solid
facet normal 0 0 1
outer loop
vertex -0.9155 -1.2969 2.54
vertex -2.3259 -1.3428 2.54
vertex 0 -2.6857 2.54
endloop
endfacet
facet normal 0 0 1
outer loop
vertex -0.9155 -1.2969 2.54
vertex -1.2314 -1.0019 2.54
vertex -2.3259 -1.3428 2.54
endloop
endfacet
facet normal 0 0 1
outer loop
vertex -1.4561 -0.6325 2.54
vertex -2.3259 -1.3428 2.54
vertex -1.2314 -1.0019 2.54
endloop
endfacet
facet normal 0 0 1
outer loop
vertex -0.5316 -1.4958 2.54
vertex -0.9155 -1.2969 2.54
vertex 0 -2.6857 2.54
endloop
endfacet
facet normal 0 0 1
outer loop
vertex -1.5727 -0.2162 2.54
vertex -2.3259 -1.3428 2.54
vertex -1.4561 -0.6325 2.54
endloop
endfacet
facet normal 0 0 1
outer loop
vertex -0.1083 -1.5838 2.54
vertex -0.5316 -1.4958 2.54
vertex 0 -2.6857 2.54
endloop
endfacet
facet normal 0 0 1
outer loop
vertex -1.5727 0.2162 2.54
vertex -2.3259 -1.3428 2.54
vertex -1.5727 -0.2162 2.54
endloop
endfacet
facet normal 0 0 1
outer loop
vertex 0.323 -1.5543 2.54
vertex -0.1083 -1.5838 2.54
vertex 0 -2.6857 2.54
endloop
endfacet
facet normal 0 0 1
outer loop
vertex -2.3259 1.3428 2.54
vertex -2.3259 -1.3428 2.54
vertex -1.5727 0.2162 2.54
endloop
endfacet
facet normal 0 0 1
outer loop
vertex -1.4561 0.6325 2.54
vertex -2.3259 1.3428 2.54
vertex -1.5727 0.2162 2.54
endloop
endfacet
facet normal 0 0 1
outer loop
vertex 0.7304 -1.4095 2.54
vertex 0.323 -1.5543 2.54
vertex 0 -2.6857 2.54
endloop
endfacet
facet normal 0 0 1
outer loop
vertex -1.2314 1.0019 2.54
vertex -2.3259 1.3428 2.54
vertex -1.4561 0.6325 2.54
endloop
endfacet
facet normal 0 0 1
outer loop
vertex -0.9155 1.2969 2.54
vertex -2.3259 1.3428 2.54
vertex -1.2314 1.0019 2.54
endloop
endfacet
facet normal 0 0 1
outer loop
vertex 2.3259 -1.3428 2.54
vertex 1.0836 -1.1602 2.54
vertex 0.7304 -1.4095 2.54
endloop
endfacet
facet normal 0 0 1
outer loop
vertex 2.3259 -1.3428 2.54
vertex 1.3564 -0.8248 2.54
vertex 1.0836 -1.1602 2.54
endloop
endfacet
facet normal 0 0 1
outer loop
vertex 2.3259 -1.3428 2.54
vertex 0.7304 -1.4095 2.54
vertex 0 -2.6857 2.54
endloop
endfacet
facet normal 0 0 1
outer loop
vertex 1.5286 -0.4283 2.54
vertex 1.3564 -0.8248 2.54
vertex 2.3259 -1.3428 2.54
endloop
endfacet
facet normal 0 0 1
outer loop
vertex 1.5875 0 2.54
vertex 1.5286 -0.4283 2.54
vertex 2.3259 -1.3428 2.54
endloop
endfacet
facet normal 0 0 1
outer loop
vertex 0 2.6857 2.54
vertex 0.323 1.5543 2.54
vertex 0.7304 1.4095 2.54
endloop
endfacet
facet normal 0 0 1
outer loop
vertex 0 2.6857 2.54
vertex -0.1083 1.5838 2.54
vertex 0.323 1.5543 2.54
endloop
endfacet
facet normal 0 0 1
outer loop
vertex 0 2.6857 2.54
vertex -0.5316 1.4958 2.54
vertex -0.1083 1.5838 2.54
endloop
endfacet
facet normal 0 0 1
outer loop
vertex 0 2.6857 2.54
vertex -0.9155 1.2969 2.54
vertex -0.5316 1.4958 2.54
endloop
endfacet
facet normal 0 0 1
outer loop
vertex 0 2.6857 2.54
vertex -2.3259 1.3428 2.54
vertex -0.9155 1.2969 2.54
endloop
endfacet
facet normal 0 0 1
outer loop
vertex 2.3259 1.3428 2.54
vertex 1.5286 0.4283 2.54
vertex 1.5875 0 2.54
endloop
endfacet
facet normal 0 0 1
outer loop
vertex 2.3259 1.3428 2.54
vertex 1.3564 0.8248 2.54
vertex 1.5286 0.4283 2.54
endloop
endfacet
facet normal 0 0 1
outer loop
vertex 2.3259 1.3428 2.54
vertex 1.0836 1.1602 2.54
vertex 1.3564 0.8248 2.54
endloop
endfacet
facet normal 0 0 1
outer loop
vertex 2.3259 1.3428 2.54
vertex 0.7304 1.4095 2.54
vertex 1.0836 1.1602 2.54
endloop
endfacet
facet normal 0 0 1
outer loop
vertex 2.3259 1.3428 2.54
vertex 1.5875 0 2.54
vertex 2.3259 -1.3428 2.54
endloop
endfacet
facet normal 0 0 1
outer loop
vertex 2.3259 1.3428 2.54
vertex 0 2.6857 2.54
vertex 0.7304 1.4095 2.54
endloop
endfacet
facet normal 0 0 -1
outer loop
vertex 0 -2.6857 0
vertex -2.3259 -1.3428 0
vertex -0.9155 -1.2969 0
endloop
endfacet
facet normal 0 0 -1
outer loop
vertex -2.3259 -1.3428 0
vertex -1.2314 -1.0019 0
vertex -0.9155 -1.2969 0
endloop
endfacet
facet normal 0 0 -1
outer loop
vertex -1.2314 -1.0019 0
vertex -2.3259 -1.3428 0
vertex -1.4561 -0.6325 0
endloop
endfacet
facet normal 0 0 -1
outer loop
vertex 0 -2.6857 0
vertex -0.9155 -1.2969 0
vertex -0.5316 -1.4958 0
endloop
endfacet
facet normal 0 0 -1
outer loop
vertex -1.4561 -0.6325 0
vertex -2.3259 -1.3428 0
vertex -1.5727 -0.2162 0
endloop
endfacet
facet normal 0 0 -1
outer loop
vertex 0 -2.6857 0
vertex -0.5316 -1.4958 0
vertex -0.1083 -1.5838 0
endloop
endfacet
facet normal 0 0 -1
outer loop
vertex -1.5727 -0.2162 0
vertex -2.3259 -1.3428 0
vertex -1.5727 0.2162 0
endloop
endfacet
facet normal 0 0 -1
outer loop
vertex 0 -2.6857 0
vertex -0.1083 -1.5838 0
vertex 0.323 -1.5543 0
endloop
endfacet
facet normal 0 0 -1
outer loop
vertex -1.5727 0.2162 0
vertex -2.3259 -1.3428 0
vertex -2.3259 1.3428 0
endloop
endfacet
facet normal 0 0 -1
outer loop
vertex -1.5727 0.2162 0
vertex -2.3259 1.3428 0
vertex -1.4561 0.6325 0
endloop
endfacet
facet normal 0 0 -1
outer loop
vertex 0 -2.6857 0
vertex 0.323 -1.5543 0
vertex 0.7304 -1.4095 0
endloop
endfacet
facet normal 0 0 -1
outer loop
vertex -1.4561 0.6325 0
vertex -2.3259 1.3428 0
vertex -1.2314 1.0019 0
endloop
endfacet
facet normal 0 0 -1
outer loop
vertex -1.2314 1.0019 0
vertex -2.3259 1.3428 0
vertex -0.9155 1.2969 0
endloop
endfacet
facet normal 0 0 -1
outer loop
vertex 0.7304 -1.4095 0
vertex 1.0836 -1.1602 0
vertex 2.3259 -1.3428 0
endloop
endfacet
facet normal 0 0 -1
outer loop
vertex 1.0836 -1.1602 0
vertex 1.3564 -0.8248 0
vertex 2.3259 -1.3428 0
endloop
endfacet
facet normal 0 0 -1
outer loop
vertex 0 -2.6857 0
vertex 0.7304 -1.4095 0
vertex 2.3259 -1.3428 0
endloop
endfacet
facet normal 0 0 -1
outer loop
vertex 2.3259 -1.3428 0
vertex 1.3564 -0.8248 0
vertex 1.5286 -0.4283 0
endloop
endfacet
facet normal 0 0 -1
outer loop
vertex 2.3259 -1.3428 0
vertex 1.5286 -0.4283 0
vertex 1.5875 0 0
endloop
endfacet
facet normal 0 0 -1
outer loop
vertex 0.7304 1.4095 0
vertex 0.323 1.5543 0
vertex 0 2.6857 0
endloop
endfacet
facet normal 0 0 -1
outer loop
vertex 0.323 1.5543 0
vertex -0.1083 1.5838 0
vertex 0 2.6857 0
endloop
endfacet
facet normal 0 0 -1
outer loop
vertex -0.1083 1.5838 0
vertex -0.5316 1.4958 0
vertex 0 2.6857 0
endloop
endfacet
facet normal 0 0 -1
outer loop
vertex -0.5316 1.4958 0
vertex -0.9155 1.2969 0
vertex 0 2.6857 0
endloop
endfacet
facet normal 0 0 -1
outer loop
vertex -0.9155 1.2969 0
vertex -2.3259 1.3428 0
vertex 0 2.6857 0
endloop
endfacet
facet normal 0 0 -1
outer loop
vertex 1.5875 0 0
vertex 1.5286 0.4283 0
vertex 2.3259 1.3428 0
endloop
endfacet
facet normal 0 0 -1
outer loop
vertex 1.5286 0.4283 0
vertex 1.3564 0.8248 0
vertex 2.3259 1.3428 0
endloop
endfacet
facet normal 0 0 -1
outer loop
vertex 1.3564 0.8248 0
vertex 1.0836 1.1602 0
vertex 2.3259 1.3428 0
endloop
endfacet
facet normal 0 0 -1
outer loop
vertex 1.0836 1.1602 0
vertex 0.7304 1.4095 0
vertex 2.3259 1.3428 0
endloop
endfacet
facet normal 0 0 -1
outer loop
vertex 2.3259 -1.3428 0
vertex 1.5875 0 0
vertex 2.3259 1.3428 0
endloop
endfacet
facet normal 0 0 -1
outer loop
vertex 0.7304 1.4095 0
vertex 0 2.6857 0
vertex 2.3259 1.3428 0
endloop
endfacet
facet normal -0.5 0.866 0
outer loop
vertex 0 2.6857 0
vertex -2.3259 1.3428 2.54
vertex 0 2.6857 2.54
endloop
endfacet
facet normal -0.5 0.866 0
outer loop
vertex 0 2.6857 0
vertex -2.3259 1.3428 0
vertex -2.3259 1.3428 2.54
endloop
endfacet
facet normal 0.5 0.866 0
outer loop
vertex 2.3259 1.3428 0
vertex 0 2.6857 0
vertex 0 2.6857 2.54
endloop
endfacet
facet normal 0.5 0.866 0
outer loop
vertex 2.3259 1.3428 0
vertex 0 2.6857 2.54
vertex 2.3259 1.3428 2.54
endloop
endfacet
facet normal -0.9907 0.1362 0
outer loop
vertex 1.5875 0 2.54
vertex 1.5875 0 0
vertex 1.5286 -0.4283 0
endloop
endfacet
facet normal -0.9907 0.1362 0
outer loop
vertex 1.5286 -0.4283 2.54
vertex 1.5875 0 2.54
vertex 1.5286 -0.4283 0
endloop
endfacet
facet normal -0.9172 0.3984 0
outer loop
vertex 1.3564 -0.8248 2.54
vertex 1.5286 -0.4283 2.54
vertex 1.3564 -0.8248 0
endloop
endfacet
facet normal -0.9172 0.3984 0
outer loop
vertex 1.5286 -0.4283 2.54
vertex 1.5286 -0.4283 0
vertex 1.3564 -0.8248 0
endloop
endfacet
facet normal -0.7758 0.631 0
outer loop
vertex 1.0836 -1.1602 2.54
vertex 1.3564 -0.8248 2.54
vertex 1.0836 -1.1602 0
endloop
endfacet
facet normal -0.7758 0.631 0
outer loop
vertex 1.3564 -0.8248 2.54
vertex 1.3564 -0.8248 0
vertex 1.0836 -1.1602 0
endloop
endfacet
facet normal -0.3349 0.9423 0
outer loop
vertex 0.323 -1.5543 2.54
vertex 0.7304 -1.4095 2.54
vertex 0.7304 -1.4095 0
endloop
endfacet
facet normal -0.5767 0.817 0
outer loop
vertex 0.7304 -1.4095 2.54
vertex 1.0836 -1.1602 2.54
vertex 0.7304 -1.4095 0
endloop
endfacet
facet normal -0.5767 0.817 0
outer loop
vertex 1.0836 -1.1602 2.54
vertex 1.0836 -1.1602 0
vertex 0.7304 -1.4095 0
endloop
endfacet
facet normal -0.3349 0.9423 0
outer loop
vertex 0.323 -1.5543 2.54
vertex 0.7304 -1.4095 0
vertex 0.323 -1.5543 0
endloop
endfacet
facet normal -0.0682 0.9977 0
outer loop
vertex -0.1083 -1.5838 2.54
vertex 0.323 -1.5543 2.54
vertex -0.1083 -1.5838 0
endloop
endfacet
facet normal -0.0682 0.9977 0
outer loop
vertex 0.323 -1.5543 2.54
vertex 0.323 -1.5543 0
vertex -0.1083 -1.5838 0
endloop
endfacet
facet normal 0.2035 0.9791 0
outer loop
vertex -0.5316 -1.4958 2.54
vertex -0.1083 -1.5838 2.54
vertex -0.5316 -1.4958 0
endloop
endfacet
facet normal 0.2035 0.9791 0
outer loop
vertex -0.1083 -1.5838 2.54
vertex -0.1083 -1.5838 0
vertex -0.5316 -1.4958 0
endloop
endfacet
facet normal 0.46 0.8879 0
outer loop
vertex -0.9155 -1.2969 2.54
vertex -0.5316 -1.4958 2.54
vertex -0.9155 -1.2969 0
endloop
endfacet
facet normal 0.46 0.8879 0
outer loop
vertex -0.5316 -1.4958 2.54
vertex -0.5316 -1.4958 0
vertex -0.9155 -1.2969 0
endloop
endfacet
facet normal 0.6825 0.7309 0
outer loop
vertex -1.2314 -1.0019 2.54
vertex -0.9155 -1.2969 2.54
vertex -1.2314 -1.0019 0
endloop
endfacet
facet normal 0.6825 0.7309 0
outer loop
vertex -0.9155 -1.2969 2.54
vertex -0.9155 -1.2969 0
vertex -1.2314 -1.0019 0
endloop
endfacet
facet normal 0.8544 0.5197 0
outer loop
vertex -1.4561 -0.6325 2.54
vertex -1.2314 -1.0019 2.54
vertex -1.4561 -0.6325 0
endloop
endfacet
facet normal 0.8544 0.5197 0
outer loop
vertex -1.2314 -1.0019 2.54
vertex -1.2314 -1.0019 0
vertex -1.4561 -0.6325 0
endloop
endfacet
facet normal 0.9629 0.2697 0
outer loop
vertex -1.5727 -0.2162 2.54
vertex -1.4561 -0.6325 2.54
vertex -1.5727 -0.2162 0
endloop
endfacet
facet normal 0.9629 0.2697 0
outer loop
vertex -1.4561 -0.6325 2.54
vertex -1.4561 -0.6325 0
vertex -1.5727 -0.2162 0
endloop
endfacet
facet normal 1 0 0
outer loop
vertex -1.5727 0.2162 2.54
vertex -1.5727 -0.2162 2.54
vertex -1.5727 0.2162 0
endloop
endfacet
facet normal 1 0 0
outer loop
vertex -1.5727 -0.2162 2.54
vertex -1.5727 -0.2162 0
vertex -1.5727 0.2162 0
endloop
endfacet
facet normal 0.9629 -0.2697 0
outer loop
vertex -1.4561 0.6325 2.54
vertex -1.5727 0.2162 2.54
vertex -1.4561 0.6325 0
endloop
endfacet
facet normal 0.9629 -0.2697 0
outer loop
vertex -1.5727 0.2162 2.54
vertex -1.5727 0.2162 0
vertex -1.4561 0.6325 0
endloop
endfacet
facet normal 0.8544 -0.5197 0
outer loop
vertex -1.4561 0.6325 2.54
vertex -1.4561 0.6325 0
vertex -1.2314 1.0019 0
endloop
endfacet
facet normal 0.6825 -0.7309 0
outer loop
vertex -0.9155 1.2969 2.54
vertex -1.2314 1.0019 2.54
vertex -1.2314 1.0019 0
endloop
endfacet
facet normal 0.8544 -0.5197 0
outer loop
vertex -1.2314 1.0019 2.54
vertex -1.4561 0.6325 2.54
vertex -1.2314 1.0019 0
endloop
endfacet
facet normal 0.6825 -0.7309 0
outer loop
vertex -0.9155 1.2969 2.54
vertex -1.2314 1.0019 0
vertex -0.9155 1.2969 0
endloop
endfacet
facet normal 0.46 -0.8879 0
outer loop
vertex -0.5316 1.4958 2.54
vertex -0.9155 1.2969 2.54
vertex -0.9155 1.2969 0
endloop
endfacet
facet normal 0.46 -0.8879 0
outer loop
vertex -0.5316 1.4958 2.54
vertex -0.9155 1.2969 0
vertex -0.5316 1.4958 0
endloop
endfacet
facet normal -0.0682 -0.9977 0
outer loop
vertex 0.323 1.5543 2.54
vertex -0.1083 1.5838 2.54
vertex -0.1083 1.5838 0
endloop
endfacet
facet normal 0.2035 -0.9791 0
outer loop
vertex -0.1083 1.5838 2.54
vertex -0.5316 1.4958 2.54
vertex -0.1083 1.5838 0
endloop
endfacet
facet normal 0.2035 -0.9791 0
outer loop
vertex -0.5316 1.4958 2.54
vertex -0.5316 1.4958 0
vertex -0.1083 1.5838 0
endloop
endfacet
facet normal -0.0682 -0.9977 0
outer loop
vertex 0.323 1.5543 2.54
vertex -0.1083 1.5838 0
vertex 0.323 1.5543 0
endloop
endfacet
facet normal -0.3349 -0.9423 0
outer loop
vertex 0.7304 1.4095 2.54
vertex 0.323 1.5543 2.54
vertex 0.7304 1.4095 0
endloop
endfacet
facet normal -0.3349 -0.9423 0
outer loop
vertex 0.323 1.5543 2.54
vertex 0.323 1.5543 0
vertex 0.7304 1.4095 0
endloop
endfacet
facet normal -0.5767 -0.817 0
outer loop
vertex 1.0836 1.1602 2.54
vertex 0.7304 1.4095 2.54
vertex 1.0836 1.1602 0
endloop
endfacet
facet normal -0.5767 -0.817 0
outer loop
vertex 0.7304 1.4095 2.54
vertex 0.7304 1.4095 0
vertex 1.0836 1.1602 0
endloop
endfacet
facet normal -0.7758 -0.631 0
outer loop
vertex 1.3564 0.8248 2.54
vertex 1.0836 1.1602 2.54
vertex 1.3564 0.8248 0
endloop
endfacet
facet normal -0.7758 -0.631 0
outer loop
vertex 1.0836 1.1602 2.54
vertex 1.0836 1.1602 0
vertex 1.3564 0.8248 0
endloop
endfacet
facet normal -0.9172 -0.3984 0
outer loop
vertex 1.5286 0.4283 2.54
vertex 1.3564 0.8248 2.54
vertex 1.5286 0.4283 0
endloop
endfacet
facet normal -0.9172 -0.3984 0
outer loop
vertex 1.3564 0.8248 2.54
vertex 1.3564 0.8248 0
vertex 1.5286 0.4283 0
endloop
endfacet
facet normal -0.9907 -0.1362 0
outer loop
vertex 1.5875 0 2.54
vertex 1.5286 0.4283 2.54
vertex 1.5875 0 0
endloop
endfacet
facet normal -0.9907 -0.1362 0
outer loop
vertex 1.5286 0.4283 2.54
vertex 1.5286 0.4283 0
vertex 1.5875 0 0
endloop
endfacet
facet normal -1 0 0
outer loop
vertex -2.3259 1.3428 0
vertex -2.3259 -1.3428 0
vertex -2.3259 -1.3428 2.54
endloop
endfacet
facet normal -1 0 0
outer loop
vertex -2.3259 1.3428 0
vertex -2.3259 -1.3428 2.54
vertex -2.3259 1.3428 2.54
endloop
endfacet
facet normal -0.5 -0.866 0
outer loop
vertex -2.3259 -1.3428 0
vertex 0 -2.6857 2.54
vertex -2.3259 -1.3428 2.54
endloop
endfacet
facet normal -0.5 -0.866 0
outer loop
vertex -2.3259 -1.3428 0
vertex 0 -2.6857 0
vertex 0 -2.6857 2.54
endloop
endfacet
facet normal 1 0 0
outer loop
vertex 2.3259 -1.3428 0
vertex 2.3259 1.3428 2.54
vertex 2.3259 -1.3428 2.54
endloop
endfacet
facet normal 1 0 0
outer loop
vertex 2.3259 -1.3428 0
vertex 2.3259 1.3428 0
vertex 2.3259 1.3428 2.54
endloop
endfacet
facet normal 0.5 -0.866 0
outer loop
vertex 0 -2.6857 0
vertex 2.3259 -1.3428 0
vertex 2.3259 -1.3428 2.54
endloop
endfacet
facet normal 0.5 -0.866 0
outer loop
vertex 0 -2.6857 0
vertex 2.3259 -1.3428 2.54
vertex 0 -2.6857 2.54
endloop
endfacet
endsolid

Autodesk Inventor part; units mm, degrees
ref_plane "YZ Plane" through (0, 0, 0) normal (1, 0, 0) x (0, 1, 0)
ref_plane "XZ Plane" through (0, 0, 0) normal (0, 1, 0) x (-1, 0, 0)
ref_plane "XY Plane" through (0, 0, 0) normal (0, 0, 1) x (1, 0, 0)
sketch "Sketch1" plane through (0, 0, 0) normal (0, 0, 1) x (1, 0, 0)
  circle A0 centre (0, 0) radius 1.5875
  line L0 (0, 2.6857) -> (2.3259, 1.3428)
  line L1 (2.3259, 1.3428) -> (2.3259, -1.3428)
  line L2 (2.3259, -1.3428) -> (0, -2.6857)
  line L3 (0, -2.6857) -> (-2.3259, -1.3428)
  line L4 (-2.3259, -1.3428) -> (-2.3259, 1.3428)
  line L5 (-2.3259, 1.3428) -> (0, 2.6857)
  dimension "d0" = 3.175
extrude "Extrusion1" add sketch "Sketch1" along normal blind 2.54
sketch "Sketch2" plane through (0, 0, 2.54) normal (0, 0, 1) x (1, 0, 0)
  point P0 (0, 0)
  point P1 (0, 0)
thread "Thread1" size "5-40 UNC" class "2B" standard "ANSI Unified Screw Threads" full length
properties part number ".125nut"
